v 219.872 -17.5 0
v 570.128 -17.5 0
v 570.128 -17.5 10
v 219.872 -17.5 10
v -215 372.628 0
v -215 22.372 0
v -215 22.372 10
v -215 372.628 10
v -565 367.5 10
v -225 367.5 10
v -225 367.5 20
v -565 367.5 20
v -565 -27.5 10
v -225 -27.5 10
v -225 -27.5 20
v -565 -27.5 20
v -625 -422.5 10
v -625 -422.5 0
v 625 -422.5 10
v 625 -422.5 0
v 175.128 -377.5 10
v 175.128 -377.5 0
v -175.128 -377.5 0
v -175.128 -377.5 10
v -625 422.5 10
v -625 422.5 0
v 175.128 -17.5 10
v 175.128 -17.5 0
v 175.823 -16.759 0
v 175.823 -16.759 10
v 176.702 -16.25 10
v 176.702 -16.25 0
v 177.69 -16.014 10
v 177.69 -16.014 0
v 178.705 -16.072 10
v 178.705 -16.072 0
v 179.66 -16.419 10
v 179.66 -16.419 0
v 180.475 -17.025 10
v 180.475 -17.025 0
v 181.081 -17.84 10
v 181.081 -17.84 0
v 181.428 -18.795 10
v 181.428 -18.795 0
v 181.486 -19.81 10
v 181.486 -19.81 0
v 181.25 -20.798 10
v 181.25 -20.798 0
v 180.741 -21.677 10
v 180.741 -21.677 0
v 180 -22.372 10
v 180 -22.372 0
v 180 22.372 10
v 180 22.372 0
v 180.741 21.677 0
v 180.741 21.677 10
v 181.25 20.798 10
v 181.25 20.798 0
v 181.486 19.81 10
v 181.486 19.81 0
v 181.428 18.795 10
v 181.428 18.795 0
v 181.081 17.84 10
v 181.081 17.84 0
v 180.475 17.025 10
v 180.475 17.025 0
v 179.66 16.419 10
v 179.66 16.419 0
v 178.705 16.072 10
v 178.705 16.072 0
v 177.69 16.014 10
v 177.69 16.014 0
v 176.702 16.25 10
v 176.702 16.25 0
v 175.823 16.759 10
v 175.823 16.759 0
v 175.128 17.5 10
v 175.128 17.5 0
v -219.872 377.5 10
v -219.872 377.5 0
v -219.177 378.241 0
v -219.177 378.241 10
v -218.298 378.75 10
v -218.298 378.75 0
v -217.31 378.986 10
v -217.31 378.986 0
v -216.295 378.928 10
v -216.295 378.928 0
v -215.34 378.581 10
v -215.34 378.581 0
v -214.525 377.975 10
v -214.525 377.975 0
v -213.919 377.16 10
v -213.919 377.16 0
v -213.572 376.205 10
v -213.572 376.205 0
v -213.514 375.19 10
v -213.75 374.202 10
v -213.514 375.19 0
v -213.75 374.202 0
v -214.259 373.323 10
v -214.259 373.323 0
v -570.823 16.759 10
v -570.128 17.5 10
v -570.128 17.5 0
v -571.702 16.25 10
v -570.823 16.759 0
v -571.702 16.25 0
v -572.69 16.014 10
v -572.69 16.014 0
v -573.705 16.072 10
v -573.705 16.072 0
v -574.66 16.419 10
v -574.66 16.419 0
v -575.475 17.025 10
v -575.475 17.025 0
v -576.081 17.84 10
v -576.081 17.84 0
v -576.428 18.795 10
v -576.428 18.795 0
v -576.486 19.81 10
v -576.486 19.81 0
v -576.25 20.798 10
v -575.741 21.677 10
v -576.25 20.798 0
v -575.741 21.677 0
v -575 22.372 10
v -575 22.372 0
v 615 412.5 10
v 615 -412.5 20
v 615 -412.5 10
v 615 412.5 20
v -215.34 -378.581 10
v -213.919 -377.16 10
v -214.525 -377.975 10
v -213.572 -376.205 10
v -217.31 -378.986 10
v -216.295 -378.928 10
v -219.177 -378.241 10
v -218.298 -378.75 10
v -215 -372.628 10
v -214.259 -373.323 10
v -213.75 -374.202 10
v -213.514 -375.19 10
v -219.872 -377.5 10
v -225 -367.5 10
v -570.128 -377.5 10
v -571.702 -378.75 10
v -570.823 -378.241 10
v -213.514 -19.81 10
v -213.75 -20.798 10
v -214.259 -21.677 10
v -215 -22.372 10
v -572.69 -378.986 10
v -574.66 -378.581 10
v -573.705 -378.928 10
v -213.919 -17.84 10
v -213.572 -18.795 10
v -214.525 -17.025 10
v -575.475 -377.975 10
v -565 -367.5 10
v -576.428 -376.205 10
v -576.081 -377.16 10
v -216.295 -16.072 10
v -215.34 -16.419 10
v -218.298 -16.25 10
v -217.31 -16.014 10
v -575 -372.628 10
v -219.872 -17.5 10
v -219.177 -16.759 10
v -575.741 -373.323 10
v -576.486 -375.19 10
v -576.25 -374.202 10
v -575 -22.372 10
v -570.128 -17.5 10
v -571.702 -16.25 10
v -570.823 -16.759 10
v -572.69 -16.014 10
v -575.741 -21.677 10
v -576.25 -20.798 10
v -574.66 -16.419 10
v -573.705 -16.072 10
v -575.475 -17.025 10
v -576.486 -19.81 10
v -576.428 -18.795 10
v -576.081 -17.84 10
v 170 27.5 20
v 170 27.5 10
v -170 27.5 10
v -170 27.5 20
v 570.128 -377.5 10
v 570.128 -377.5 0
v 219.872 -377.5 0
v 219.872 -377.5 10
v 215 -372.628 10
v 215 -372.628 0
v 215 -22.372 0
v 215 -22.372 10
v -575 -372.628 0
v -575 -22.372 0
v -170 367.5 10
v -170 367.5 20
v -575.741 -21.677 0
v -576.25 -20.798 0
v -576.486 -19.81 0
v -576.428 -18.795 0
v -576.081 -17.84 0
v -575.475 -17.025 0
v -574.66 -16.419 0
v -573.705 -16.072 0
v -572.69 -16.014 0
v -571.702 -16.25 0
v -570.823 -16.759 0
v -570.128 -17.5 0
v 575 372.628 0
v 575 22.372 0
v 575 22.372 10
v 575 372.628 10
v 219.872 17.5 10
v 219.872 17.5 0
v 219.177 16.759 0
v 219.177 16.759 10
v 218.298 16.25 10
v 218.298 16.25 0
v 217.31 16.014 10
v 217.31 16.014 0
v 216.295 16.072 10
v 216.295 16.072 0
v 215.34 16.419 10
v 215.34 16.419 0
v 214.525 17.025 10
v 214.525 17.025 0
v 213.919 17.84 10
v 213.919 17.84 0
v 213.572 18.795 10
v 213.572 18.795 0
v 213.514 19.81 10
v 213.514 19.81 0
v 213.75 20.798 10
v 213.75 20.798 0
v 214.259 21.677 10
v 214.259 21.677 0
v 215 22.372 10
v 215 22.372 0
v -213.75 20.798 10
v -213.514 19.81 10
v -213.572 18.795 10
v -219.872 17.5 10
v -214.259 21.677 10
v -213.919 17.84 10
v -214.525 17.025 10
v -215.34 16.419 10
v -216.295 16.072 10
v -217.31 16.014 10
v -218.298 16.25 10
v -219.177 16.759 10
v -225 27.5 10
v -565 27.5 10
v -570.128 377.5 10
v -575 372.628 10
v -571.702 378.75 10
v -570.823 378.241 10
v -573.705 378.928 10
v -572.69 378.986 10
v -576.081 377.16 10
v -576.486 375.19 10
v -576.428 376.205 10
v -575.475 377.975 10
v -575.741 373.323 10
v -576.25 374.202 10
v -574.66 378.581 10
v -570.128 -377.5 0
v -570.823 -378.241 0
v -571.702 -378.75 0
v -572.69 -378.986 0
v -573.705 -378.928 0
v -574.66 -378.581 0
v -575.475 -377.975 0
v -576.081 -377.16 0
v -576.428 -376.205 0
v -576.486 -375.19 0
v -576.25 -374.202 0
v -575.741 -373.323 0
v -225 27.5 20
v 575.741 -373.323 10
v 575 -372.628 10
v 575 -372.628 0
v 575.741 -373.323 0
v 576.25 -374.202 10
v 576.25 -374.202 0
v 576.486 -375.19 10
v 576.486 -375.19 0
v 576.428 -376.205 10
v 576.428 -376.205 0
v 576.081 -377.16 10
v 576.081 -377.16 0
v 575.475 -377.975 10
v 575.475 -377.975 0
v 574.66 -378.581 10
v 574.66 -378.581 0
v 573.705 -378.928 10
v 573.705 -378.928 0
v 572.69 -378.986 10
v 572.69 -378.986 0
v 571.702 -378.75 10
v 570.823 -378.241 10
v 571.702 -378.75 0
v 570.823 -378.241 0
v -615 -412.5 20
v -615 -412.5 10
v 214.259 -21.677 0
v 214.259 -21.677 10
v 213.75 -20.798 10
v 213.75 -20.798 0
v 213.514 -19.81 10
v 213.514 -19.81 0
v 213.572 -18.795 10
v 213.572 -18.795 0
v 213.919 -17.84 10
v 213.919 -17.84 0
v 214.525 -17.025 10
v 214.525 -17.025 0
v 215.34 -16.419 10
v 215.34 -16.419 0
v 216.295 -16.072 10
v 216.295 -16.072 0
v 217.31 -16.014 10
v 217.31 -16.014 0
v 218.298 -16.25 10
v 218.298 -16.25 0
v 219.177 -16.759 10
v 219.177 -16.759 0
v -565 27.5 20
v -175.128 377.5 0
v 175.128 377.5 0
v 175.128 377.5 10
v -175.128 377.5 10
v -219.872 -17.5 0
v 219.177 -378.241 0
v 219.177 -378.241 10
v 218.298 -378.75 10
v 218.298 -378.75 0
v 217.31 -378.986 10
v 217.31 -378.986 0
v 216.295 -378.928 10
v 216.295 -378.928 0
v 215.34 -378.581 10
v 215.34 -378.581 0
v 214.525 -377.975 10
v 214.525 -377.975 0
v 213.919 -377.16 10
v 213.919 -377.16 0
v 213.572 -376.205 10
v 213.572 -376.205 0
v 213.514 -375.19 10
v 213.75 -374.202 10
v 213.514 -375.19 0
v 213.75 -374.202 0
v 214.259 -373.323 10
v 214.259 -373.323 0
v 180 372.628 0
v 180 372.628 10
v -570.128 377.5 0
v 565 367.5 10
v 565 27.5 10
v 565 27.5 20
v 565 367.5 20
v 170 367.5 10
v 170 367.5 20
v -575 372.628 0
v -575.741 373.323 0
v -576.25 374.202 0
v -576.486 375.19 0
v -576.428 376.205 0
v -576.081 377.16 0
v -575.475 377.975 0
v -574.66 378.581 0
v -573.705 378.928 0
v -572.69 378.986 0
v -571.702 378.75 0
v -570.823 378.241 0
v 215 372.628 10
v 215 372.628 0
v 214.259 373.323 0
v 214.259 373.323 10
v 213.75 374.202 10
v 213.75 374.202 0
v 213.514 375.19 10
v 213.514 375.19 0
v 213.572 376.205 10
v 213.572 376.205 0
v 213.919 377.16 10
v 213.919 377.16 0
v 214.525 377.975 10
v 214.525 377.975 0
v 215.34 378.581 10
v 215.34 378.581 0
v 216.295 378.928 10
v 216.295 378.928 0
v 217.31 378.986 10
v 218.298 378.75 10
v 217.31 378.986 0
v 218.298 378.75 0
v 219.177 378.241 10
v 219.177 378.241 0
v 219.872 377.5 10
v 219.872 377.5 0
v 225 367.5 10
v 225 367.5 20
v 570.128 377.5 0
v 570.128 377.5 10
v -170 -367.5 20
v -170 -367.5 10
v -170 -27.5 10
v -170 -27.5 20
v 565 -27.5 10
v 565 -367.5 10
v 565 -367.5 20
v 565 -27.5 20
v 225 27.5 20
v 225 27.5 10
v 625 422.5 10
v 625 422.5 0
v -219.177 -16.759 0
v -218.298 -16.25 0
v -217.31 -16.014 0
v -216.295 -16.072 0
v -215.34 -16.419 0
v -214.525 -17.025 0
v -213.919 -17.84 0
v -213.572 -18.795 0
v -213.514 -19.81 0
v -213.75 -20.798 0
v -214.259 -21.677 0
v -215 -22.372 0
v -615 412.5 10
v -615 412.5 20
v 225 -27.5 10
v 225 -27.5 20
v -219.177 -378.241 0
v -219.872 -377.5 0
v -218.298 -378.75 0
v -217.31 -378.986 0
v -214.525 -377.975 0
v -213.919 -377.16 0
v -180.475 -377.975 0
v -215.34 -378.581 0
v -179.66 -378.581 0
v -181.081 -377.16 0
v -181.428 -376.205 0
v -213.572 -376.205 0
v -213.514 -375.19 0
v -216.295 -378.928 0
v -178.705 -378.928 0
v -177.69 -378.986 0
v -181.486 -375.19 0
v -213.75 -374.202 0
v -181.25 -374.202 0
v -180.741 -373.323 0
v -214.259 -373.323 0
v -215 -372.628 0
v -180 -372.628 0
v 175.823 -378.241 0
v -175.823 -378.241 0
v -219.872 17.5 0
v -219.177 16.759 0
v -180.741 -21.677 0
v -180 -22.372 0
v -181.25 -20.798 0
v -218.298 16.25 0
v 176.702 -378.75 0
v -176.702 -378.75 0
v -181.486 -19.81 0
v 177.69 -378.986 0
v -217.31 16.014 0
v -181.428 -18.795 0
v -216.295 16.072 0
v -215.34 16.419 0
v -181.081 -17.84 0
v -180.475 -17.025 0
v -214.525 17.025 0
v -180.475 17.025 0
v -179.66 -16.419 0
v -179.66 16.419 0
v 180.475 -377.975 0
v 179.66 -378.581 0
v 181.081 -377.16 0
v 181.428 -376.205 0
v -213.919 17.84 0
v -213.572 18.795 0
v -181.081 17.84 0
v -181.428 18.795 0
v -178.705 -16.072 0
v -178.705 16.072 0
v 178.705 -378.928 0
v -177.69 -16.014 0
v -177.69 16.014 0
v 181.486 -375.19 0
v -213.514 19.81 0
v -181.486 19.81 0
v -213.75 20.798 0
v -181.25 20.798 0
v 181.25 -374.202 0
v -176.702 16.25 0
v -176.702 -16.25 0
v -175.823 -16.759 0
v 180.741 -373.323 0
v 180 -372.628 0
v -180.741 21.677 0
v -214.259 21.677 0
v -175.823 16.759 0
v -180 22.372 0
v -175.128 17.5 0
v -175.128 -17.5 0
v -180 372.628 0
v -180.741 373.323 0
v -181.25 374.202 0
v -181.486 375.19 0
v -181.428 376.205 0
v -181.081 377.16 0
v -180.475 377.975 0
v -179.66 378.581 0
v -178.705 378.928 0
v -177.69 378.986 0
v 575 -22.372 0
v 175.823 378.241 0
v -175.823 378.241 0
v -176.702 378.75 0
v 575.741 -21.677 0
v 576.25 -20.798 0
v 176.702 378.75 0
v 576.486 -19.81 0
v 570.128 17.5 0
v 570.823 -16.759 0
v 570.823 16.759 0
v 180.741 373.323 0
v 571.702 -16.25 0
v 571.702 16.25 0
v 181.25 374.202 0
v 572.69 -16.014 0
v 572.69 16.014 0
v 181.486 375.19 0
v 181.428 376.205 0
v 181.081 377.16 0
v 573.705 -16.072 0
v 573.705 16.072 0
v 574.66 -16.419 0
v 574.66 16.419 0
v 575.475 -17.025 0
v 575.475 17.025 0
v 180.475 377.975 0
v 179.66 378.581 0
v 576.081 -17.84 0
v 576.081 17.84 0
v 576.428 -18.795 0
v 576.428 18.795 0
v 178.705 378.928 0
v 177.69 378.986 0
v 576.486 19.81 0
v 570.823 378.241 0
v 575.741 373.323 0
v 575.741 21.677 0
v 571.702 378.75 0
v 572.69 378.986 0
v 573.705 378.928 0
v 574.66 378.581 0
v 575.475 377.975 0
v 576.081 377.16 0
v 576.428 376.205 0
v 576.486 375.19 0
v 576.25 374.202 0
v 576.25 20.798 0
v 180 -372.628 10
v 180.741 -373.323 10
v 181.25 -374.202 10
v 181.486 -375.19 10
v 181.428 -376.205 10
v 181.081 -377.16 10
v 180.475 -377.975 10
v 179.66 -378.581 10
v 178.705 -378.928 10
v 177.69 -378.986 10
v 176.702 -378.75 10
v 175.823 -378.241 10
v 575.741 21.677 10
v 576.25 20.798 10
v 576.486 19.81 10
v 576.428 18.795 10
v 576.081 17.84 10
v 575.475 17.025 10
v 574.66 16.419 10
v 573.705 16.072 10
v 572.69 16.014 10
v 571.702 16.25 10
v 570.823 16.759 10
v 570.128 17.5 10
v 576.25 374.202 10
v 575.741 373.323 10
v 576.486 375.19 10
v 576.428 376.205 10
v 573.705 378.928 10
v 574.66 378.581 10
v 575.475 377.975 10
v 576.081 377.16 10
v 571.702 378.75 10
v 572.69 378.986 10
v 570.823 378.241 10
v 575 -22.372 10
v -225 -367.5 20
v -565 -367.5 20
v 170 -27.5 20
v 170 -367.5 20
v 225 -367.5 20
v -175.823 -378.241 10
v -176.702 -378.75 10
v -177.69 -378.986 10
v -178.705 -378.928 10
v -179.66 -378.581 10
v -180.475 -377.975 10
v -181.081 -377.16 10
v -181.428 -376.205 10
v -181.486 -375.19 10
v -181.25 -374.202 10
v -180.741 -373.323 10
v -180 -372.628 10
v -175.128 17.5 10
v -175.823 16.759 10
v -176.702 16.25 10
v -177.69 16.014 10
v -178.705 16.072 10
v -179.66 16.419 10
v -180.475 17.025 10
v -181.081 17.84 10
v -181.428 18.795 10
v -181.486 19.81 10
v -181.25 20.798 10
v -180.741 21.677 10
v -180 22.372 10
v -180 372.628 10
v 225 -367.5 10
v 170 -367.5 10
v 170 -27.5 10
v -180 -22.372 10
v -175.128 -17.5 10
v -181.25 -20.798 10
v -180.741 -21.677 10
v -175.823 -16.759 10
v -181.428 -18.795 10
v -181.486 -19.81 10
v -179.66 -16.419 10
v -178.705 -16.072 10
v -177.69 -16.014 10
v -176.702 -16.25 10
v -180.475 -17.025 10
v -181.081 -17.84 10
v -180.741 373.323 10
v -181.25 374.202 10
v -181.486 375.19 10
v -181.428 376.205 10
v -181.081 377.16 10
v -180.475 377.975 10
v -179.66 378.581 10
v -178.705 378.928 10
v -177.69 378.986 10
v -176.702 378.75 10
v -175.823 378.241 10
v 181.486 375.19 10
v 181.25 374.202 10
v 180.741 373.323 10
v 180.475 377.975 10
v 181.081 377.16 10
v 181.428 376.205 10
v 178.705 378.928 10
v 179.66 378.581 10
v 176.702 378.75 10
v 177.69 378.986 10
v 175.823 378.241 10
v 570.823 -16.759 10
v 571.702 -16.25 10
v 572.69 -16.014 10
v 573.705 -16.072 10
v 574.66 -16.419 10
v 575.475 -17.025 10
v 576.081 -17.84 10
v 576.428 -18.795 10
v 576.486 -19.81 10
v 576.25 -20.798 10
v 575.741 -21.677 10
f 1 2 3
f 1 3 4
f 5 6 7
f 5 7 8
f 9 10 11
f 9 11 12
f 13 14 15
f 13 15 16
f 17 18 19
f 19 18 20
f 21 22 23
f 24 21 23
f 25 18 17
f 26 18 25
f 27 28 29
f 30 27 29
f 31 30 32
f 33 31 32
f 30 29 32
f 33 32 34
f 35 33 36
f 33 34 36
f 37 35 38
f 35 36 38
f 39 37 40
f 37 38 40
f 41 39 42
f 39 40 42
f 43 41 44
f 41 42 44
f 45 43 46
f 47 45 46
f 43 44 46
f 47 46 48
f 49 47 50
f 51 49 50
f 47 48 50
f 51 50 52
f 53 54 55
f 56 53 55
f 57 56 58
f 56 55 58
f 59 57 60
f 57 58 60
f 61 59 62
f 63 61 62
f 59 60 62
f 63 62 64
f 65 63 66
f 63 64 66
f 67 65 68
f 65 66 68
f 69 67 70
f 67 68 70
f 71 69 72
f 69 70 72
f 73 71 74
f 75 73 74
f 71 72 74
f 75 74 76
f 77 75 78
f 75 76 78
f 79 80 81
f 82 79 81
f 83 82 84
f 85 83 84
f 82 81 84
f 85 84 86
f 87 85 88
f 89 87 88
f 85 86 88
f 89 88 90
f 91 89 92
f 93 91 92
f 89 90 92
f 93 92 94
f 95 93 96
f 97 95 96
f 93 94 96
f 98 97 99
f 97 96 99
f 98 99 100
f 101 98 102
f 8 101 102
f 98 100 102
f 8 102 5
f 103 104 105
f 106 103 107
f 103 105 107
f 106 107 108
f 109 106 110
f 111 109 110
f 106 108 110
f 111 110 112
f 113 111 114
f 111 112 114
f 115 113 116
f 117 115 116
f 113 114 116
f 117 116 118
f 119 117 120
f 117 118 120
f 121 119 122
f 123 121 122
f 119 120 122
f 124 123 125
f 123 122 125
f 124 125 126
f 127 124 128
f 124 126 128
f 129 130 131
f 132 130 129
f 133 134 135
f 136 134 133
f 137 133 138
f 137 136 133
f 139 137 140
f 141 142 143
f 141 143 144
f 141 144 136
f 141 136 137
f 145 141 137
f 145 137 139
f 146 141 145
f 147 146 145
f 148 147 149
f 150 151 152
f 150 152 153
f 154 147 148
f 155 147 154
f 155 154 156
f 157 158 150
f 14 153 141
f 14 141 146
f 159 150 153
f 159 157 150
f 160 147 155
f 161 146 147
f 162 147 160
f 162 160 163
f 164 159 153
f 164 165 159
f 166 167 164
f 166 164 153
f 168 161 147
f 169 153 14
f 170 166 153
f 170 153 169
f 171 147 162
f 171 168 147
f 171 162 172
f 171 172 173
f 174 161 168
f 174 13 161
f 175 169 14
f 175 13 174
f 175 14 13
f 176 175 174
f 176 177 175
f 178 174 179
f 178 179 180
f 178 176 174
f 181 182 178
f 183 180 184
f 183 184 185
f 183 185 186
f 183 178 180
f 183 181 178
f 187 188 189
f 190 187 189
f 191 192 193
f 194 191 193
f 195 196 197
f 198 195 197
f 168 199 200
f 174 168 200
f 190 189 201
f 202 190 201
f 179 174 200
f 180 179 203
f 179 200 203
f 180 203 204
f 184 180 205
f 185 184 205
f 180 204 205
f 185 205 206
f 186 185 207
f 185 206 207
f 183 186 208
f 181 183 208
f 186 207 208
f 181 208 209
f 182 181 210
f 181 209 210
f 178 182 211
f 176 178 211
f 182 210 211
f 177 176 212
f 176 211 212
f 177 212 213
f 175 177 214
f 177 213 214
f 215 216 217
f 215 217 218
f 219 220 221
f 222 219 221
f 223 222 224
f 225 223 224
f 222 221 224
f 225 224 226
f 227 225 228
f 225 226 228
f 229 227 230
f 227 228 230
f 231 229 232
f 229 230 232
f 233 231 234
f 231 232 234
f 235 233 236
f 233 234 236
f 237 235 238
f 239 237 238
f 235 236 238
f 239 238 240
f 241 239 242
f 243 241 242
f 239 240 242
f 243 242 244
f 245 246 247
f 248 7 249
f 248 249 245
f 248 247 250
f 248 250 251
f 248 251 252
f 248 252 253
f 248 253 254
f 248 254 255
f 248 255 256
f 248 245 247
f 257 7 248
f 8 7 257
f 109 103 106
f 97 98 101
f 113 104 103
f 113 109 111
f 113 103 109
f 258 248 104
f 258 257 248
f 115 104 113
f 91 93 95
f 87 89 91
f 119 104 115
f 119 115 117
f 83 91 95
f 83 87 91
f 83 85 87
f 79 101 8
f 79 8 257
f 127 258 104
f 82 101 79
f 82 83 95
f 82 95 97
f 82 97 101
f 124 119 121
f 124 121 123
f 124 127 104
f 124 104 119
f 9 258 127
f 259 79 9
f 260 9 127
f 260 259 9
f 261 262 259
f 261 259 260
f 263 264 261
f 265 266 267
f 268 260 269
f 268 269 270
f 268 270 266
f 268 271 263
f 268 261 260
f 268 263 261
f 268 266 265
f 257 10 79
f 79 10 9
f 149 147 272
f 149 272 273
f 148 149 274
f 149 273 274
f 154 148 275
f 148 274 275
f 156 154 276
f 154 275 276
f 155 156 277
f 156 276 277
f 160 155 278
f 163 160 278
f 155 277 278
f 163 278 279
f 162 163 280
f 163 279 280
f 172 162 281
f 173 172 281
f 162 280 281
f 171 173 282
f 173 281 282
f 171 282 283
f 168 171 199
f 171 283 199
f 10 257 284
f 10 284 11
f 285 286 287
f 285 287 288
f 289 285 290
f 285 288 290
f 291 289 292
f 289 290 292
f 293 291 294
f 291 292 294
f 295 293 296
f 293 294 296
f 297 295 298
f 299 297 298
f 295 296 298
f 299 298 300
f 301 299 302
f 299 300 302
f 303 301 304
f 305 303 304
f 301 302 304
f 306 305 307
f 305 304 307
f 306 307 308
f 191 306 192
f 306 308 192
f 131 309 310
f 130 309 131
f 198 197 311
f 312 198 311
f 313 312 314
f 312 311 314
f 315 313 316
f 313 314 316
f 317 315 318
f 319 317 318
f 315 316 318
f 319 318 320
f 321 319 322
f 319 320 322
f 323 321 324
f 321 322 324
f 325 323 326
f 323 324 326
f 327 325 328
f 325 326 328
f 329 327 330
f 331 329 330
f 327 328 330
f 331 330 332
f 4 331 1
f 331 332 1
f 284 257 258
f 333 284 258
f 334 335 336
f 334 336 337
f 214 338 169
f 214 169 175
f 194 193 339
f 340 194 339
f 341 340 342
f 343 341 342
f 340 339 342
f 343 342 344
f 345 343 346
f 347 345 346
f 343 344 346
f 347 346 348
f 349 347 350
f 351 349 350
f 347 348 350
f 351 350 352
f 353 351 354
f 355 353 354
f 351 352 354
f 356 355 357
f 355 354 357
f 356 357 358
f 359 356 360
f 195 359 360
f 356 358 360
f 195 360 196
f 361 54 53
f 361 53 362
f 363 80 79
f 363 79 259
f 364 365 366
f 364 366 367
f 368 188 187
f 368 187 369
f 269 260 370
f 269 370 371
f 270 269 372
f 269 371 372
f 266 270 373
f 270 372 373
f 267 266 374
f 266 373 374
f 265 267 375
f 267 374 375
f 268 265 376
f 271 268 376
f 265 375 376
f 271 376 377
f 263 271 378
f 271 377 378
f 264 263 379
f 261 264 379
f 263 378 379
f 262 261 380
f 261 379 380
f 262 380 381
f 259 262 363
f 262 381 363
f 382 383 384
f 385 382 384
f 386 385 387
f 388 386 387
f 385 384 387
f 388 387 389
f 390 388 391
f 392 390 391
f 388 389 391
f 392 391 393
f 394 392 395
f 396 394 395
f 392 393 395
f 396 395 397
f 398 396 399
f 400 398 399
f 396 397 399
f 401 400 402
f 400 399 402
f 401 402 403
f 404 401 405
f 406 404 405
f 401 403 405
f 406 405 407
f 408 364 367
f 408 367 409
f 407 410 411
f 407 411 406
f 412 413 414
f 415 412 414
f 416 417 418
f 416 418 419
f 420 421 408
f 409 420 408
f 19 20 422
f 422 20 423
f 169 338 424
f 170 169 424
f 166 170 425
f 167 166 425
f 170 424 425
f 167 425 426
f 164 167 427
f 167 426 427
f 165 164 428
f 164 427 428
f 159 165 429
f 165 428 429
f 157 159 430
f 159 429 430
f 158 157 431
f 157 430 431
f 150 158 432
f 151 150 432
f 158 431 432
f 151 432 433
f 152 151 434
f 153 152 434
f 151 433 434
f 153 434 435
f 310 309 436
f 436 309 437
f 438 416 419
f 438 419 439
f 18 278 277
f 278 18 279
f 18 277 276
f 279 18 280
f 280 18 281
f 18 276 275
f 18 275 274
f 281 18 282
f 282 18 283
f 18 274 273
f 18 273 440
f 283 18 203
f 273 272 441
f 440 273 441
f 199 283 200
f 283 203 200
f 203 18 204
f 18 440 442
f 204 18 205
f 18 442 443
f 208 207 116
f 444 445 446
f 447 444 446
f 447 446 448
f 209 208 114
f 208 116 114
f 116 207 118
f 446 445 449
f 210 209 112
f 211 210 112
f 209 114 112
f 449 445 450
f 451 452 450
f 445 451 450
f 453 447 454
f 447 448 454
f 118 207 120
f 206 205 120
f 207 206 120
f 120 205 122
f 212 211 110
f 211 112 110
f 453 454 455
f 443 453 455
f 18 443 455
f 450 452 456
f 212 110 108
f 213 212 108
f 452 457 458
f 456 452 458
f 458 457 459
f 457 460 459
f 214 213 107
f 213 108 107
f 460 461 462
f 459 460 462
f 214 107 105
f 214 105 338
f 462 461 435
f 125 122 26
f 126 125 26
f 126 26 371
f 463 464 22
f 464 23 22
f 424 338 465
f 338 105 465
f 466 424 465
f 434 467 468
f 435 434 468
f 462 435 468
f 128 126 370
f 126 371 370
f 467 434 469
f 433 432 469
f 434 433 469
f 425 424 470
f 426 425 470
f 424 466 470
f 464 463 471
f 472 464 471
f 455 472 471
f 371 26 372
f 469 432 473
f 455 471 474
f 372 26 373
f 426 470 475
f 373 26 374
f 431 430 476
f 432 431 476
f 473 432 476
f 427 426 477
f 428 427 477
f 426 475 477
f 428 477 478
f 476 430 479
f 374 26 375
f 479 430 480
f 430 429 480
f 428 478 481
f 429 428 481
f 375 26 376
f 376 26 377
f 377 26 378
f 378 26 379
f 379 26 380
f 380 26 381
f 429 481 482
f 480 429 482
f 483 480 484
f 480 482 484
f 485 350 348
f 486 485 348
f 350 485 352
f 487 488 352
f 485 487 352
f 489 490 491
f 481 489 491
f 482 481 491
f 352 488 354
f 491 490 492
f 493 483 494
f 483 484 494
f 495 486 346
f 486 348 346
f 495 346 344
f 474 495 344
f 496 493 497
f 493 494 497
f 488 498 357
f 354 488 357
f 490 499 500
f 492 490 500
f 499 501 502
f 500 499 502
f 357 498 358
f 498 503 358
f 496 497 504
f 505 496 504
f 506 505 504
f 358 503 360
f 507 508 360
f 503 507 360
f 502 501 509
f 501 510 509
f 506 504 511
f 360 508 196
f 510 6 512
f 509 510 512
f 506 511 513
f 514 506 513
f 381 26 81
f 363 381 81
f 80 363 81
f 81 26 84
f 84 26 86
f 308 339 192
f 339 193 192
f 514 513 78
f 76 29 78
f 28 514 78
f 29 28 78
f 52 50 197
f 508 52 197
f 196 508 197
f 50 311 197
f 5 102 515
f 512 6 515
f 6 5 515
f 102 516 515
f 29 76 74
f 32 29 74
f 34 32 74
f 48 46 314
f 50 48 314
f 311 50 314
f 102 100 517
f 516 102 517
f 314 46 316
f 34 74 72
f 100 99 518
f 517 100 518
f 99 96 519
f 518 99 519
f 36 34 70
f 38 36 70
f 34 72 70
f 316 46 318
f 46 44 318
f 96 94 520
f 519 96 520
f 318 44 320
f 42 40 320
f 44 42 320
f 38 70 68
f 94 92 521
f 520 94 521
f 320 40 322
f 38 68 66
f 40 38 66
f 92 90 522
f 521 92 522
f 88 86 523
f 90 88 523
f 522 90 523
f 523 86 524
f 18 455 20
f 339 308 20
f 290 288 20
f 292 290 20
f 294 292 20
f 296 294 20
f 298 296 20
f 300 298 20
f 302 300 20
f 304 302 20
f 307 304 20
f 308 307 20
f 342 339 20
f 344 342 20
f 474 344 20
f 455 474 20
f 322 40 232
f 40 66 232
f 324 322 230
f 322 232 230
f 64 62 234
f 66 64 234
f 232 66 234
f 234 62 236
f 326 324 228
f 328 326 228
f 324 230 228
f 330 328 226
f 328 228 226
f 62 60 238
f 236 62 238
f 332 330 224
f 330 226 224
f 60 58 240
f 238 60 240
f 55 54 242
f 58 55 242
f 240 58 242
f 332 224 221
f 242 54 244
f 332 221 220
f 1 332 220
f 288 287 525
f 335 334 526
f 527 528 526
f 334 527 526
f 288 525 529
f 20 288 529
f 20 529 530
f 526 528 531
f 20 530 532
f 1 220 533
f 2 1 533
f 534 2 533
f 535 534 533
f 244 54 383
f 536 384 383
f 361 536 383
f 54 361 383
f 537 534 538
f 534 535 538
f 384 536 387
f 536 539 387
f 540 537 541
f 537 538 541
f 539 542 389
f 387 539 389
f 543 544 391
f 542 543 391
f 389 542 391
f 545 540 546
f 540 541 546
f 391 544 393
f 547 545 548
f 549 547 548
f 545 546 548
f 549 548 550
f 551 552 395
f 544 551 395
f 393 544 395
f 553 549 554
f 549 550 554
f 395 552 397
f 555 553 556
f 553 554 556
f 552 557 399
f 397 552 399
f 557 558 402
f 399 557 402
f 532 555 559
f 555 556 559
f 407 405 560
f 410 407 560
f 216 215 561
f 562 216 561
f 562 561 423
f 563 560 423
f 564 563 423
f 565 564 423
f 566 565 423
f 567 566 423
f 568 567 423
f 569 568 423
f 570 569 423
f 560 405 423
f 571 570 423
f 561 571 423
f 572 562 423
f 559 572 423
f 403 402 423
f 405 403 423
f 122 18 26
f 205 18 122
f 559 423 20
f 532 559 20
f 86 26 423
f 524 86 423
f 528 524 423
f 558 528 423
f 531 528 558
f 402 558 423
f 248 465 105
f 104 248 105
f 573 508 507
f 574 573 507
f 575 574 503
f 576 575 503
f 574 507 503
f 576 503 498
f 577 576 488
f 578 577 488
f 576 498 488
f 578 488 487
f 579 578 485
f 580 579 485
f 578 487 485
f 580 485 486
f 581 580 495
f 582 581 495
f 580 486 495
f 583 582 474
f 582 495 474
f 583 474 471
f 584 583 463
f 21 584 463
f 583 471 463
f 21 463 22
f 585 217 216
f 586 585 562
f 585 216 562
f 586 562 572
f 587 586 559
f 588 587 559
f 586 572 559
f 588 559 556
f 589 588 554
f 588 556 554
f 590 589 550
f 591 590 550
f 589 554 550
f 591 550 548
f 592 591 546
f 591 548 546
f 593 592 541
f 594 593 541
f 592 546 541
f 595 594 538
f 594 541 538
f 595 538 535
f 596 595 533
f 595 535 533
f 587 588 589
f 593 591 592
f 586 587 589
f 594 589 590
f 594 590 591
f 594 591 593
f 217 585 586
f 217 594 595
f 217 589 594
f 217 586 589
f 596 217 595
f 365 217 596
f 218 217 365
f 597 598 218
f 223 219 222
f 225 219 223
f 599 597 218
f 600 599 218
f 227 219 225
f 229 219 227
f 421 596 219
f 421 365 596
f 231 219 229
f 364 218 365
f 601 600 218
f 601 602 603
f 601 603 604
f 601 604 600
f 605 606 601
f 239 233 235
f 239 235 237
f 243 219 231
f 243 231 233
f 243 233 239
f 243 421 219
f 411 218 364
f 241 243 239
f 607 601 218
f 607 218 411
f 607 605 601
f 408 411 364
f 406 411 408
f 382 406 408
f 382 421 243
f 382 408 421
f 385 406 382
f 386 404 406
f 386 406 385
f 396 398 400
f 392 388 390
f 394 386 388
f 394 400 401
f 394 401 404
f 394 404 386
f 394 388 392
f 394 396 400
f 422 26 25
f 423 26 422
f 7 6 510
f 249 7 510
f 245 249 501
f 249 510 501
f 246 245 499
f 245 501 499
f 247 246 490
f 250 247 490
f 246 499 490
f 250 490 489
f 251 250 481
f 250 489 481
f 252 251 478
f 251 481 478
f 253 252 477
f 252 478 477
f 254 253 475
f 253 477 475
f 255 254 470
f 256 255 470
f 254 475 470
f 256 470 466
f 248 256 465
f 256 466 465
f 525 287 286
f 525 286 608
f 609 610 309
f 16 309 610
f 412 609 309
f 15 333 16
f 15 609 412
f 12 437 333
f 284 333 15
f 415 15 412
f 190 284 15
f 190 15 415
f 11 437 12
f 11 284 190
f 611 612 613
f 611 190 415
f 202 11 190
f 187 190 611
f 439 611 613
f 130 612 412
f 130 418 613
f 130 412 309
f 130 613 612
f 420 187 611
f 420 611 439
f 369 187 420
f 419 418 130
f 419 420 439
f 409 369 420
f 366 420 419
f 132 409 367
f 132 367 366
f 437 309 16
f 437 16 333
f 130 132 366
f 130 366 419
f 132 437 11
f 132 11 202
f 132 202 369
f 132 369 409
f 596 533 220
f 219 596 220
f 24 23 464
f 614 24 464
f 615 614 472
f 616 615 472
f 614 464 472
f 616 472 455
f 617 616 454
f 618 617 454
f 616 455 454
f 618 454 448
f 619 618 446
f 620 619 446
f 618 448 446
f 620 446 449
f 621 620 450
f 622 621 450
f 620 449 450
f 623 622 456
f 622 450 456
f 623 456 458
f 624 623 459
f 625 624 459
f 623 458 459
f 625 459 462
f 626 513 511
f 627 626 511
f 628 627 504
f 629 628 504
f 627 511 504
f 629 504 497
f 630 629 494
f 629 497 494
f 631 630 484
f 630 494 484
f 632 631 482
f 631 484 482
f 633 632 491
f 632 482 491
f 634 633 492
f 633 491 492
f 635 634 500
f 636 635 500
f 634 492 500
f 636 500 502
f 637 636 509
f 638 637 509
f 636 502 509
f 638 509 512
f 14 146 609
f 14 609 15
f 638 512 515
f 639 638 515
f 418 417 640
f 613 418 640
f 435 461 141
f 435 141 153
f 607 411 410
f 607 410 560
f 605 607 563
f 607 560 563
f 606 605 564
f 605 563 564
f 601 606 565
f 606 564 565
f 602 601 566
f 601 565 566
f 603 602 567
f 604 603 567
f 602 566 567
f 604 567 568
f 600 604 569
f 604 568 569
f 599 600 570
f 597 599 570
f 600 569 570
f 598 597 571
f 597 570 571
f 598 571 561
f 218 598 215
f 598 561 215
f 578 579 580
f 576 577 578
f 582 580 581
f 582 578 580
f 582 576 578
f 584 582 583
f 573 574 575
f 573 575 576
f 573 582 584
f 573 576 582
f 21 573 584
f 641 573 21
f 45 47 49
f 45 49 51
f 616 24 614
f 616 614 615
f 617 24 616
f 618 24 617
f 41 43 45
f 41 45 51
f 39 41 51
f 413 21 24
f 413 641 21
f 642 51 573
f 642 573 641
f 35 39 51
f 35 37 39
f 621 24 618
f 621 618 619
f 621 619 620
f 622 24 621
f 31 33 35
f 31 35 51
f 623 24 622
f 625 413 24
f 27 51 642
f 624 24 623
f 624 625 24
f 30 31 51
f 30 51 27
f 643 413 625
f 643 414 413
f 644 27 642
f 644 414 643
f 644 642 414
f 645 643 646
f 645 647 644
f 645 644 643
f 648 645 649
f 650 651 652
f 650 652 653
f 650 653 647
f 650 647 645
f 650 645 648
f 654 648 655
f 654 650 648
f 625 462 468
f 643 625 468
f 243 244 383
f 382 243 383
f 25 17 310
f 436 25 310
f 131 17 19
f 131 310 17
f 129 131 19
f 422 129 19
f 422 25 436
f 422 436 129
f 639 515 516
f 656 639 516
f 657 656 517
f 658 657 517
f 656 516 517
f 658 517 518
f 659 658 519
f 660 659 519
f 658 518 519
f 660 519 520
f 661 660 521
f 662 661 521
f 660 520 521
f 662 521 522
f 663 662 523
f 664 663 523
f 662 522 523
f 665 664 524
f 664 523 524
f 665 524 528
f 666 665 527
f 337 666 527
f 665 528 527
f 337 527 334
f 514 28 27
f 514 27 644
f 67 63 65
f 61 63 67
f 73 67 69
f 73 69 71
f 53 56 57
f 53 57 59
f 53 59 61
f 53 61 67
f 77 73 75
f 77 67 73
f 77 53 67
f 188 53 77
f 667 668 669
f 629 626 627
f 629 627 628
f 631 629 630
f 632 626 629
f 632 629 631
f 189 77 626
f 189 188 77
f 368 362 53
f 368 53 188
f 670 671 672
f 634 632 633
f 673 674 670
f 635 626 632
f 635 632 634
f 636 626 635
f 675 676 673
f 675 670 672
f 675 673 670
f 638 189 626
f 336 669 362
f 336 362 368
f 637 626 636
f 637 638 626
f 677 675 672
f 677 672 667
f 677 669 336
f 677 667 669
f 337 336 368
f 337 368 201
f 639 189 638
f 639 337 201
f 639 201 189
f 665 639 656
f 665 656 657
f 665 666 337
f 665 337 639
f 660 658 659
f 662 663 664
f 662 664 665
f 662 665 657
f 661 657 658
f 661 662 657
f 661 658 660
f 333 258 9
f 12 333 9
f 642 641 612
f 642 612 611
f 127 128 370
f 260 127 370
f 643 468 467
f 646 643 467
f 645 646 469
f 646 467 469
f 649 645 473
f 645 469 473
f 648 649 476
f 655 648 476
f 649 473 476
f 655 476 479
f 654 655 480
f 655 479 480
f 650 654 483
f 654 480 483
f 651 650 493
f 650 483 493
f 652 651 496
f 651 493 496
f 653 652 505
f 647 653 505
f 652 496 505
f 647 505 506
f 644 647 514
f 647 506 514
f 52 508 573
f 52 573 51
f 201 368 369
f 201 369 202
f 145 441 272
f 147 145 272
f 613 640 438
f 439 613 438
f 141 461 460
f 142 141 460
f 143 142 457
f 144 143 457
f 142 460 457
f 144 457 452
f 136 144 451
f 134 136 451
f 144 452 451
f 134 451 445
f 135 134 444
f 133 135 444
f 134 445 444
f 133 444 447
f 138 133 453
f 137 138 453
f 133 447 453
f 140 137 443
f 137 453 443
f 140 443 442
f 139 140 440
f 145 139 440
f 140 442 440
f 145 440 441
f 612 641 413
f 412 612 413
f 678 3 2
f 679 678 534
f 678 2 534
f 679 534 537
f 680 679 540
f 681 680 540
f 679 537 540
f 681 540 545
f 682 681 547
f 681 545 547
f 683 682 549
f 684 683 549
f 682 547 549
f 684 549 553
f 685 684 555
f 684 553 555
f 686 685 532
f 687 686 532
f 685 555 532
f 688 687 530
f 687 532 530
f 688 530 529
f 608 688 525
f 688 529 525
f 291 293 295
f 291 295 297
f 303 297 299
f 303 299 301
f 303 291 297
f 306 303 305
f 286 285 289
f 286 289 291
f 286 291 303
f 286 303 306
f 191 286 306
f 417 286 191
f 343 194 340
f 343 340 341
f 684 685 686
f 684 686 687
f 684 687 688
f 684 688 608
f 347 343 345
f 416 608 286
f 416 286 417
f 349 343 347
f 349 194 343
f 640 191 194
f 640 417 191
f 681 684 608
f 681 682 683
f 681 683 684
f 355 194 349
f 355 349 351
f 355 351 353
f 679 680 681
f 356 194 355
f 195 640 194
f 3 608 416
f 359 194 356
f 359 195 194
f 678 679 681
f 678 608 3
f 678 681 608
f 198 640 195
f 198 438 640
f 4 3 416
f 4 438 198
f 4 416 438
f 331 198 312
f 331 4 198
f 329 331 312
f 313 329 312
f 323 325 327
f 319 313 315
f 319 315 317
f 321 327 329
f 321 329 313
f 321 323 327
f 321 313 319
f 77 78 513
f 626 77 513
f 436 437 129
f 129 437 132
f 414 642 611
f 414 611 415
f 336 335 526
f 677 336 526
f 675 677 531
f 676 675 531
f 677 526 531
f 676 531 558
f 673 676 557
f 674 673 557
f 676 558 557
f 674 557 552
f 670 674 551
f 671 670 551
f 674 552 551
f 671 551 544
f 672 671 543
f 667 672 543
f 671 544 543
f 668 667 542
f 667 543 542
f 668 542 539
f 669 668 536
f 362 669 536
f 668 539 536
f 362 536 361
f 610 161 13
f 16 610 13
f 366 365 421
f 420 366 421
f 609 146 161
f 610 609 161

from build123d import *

# Parameters (mm, degrees)
SKETCH1_W           = 1250
SKETCH1_H           = 845
BOSS_EXTRUDE1_DEPTH = 20
SKETCH2_W           = 360
SKETCH2_H           = 360
CUT_EXTRUDE1_DEPTH  = 10
SKETCH3_W           = 340
SKETCH3_H           = 340
CUT_EXTRUDE2_DEPTH  = 11
SKETCH4_W           = 1250
SKETCH4_H           = 845
SKETCH4_W_2         = 1230
SKETCH4_H_2         = 825
CUT_EXTRUDE3_DEPTH  = 10


with BuildPart() as part:
    # Sketch1 → Boss-Extrude1 (new body)
    with BuildSketch(Plane.XY):
        Rectangle(SKETCH1_W, SKETCH1_H)
    extrude(amount=BOSS_EXTRUDE1_DEPTH)

    # Sketch2 → Cut-Extrude1 (cut)
    with BuildSketch(Plane(origin=(0, 0, 0), x_dir=(-1, 0, 0), z_dir=(0, 0, -1))):
        with Locations((-395, 197.5)):
            Rectangle(SKETCH2_W, SKETCH2_H)
        with BuildLine():
            Line((-575, 372.627718677), (-575, 377.5))
            Line((-575, 377.5), (-570.127718677, 377.5))
            ThreePointArc((-570.127718677, 377.5), (-575.474873734, 377.974873734), (-575, 372.627718677))
        make_face()
        with BuildLine():
            ThreePointArc((-215, 372.627718677), (-214.525126266, 377.974873734), (-219.872281323, 377.5))
            Line((-219.872281323, 377.5), (-215, 377.5))
            Line((-215, 377.5), (-215, 372.627718677))
        make_face()
        with BuildLine():
            Line((-180, 372.627718677), (-180, 377.5))
            Line((-180, 377.5), (-175.127718677, 377.5))
            ThreePointArc((-175.127718677, 377.5), (-180.474873734, 377.974873734), (-180, 372.627718677))
        make_face()
        with BuildLine():
            Line((-575, 17.5), (-575, 22.372281323))
            ThreePointArc((-575, 22.372281323), (-575.474873734, 17.025126266), (-570.127718677, 17.5))
            Line((-570.127718677, 17.5), (-575, 17.5))
        make_face()
        with BuildLine():
            ThreePointArc((-219.872281323, 17.5), (-214.525126266, 17.025126266), (-215, 22.372281323))
            Line((-215, 22.372281323), (-215, 17.5))
            Line((-215, 17.5), (-219.872281323, 17.5))
        make_face()
        with BuildLine():
            Line((-180, 17.5), (-180, 22.372281323))
            ThreePointArc((-180, 22.372281323), (-180.474873734, 17.025126266), (-175.127718677, 17.5))
            Line((-175.127718677, 17.5), (-180, 17.5))
        make_face()
        with Locations((0, 197.5)):
            Rectangle(SKETCH2_W, SKETCH2_H)
        with BuildLine():
            Line((180, 17.5), (175.127718677, 17.5))
            ThreePointArc((175.127718677, 17.5), (180.474873734, 17.025126266), (180, 22.372281323))
            Line((180, 22.372281323), (180, 17.5))
        make_face()
        with BuildLine():
            Line((175.127718677, -17.5), (180, -17.5))
            Line((180, -17.5), (180, -22.372281323))
            ThreePointArc((180, -22.372281323), (180.474873734, -17.025126266), (175.127718677, -17.5))
        make_face()
        with BuildLine():
            Line((215, -17.5), (219.872281323, -17.5))
            ThreePointArc((219.872281323, -17.5), (214.525126266, -17.025126266), (215, -22.372281323))
            Line((215, -22.372281323), (215, -17.5))
        make_face()
        with BuildLine():
            Line((215, 17.5), (215, 22.372281323))
            ThreePointArc((215, 22.372281323), (214.525126266, 17.025126266), (219.872281323, 17.5))
            Line((219.872281323, 17.5), (215, 17.5))
        make_face()
        with Locations((395, 197.5)):
            Rectangle(SKETCH2_W, SKETCH2_H)
        with BuildLine():
            ThreePointArc((180, 372.627718677), (180.474873734, 377.974873734), (175.127718677, 377.5))
            Line((175.127718677, 377.5), (180, 377.5))
            Line((180, 377.5), (180, 372.627718677))
        make_face()
        with BuildLine():
            Line((215, 372.627718677), (215, 377.5))
            Line((215, 377.5), (219.872281323, 377.5))
            ThreePointArc((219.872281323, 377.5), (214.525126266, 377.974873734), (215, 372.627718677))
        make_face()
        with BuildLine():
            ThreePointArc((575, 372.627718677), (575.474873734, 377.974873734), (570.127718677, 377.5))
            Line((570.127718677, 377.5), (575, 377.5))
            Line((575, 377.5), (575, 372.627718677))
        make_face()
        with BuildLine():
            Line((575, 17.5), (570.127718677, 17.5))
            ThreePointArc((570.127718677, 17.5), (575.474873734, 17.025126266), (575, 22.372281323))
            Line((575, 22.372281323), (575, 17.5))
        make_face()
        with BuildLine():
            Line((570.127718677, -17.5), (575, -17.5))
            Line((575, -17.5), (575, -22.372281323))
            ThreePointArc((575, -22.372281323), (575.474873734, -17.025126266), (570.127718677, -17.5))
        make_face()
        with Locations((395, -197.5)):
            Rectangle(SKETCH2_W, SKETCH2_H)
        with BuildLine():
            ThreePointArc((570.127718677, -377.5), (575.474873734, -377.974873734), (575, -372.627718677))
            Line((575, -372.627718677), (575, -377.5))
            Line((575, -377.5), (570.127718677, -377.5))
        make_face()
        with BuildLine():
            Line((215, -377.5), (215, -372.627718677))
            ThreePointArc((215, -372.627718677), (214.525126266, -377.974873734), (219.872281323, -377.5))
            Line((219.872281323, -377.5), (215, -377.5))
        make_face()
        with BuildLine():
            ThreePointArc((175.127718677, -377.5), (180.474873734, -377.974873734), (180, -372.627718677))
            Line((180, -372.627718677), (180, -377.5))
            Line((180, -377.5), (175.127718677, -377.5))
        make_face()
        with Locations((0, -197.5)):
            Rectangle(SKETCH2_W, SKETCH2_H)
        with BuildLine():
            Line((-180, -17.5), (-175.127718677, -17.5))
            ThreePointArc((-175.127718677, -17.5), (-180.474873734, -17.025126266), (-180, -22.372281323))
            Line((-180, -22.372281323), (-180, -17.5))
        make_face()
        with BuildLine():
            Line((-215, -17.5), (-215, -22.372281323))
            ThreePointArc((-215, -22.372281323), (-214.525126266, -17.025126266), (-219.872281323, -17.5))
            Line((-219.872281323, -17.5), (-215, -17.5))
        make_face()
        with Locations((-395, -197.5)):
            Rectangle(SKETCH2_W, SKETCH2_H)
        with BuildLine():
            ThreePointArc((-570.127718677, -17.5), (-575.474873734, -17.025126266), (-575, -22.372281323))
            Line((-575, -22.372281323), (-575, -17.5))
            Line((-575, -17.5), (-570.127718677, -17.5))
        make_face()
        with BuildLine():
            ThreePointArc((-575, -372.627718677), (-575.474873734, -377.974873734), (-570.127718677, -377.5))
            Line((-570.127718677, -377.5), (-575, -377.5))
            Line((-575, -377.5), (-575, -372.627718677))
        make_face()
        with BuildLine():
            Line((-215, -372.627718677), (-215, -377.5))
            Line((-215, -377.5), (-219.872281323, -377.5))
            ThreePointArc((-219.872281323, -377.5), (-214.525126266, -377.974873734), (-215, -372.627718677))
        make_face()
        with BuildLine():
            ThreePointArc((-180, -372.627718677), (-180.474873734, -377.974873734), (-175.127718677, -377.5))
            Line((-175.127718677, -377.5), (-180, -377.5))
            Line((-180, -377.5), (-180, -372.627718677))
        make_face()
    extrude(amount=-CUT_EXTRUDE1_DEPTH, mode=Mode.SUBTRACT)

    # Sketch3 → Cut-Extrude2 (cut, through all)
    with BuildSketch(Plane(origin=(0, 0, 10), x_dir=(-1, 0, 0), z_dir=(0, 0, -1))):
        with Locations((0, 197.5)):
            Rectangle(SKETCH3_W, SKETCH3_H)
        with Locations((395, 197.5)):
            Rectangle(SKETCH3_W, SKETCH3_H)
        with Locations((-395, 197.5)):
            Rectangle(SKETCH3_W, SKETCH3_H)
        with Locations((-395, -197.5)):
            Rectangle(SKETCH3_W, SKETCH3_H)
        with Locations((0, -197.5)):
            Rectangle(SKETCH3_W, SKETCH3_H)
        with Locations((395, -197.5)):
            Rectangle(SKETCH3_W, SKETCH3_H)
    extrude(amount=-CUT_EXTRUDE2_DEPTH, mode=Mode.SUBTRACT)

    # Sketch4 → Cut-Extrude3 (cut)
    with BuildSketch(Plane.XY.offset(20)):
        Rectangle(SKETCH4_W, SKETCH4_H)
        Rectangle(SKETCH4_W_2, SKETCH4_H_2, mode=Mode.SUBTRACT)
    extrude(amount=-CUT_EXTRUDE3_DEPTH, mode=Mode.SUBTRACT)


solid = part.part
